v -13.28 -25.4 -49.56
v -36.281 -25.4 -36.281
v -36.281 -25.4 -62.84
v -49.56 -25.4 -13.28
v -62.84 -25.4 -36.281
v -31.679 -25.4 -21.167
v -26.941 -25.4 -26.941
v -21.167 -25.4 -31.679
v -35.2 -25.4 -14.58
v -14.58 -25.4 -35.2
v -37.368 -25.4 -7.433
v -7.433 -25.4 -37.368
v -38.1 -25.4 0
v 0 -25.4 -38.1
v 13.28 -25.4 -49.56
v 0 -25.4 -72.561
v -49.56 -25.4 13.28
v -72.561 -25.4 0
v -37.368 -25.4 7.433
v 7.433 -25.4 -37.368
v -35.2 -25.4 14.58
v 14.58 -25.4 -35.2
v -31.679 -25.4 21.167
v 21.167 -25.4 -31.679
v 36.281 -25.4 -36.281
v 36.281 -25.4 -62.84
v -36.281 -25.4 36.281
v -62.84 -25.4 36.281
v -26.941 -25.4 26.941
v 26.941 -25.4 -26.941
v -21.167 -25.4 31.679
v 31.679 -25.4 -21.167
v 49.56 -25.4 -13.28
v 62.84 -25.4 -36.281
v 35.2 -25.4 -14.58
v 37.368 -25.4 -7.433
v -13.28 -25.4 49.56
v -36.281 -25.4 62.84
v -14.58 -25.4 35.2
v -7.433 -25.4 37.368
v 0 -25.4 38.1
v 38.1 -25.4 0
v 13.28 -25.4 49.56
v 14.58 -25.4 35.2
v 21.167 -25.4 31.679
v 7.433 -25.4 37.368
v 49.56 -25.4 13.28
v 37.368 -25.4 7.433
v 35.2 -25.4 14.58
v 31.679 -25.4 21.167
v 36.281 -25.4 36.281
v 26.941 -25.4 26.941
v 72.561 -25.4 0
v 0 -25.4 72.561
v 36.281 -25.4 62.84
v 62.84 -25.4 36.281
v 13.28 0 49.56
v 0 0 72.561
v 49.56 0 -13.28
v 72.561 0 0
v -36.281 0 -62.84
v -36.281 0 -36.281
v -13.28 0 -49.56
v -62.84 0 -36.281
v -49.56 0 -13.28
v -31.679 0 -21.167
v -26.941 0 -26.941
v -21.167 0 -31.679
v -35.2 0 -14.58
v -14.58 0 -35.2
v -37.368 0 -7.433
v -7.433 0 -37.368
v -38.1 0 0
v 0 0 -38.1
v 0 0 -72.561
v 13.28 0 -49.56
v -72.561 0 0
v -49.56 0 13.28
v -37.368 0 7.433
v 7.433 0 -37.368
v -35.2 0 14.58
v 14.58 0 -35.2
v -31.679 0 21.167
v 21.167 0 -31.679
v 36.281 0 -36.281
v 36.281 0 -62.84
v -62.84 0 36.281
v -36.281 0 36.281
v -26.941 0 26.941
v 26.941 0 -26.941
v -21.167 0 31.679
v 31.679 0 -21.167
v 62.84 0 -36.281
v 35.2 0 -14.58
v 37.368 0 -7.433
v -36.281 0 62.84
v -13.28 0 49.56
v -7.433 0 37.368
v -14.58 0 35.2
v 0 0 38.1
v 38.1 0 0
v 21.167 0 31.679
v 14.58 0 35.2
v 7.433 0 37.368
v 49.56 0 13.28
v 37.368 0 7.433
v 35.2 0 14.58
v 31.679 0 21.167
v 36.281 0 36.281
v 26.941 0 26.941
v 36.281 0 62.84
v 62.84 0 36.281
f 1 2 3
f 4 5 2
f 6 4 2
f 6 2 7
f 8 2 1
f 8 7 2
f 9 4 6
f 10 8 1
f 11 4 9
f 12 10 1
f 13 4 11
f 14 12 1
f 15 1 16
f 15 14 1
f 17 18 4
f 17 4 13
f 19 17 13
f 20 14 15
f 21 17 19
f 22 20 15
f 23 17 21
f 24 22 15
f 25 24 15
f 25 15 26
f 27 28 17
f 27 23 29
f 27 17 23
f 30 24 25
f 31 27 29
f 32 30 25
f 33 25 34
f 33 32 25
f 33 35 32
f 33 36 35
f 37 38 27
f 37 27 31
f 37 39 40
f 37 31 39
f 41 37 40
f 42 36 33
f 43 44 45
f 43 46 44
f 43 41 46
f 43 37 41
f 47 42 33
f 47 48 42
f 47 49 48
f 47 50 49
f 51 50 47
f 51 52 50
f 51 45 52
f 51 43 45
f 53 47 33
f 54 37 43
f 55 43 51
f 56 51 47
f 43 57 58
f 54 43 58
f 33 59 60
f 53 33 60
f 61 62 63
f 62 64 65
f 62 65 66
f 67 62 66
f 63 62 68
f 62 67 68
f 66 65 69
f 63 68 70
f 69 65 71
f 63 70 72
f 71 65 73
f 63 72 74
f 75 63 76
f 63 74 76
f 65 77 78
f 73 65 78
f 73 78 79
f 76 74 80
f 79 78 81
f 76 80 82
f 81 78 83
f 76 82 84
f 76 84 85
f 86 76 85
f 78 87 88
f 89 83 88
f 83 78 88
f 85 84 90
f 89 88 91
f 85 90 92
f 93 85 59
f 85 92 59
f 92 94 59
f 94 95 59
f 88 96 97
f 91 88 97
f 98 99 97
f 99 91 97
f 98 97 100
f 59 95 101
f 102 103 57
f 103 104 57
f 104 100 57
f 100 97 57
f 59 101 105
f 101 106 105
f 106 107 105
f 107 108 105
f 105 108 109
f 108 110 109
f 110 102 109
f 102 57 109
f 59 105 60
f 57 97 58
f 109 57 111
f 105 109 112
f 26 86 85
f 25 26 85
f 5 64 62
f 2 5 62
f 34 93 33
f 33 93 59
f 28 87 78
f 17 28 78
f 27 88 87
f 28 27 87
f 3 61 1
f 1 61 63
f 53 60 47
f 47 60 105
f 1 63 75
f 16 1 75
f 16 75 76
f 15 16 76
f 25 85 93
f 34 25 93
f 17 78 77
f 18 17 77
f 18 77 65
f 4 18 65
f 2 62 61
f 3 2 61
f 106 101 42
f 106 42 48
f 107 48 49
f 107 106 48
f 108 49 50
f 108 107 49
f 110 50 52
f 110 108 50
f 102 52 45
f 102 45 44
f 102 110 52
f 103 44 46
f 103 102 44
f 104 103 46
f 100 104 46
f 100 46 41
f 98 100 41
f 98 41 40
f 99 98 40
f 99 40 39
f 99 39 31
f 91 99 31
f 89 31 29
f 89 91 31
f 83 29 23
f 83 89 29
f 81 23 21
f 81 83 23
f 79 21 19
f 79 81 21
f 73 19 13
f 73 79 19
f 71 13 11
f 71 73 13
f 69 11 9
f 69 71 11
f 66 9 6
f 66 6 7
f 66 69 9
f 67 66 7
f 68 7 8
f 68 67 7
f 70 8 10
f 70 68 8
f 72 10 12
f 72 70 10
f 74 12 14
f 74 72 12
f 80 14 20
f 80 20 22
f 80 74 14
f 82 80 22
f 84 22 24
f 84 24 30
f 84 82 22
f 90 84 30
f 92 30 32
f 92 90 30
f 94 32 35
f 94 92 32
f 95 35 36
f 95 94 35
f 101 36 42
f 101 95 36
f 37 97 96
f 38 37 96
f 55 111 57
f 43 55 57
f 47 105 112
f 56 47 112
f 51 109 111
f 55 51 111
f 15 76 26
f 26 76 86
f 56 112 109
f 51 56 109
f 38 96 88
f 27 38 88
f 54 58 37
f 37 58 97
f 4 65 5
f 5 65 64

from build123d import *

# Parameters (mm, degrees)
F0_R     = 38.1
F1_DEPTH = 25.4


with BuildPart() as f1:
    # F0 (on Front) → F1 (new body)
    with BuildSketch(Plane.XZ):
        with BuildLine():
            ThreePointArc((49.1988245643, 12.6536817364), (50.3981164721, 6.3772922205), (50.8, 0))
            ThreePointArc((50.8, 0), (50.3981164721, -6.3772922205), (49.1988245643, -12.6536817364))
            Line((49.1988245643, -12.6536817364), (49.5602090261, -13.2796179853))
            Line((49.5602090261, -13.2796179853), (72.5611820817, 0))
            Line((72.5611820817, 0), (49.5602090261, 13.2796179853))
            Line((49.5602090261, 13.2796179853), (49.1988245643, 12.6536817364))
        make_face()
        with BuildLine():
            ThreePointArc((48.9342727773, 13.641002447), (49.0690319755, 13.1480074912), (49.1988245643, 12.6536817364))
            Line((49.1988245643, 12.6536817364), (49.5602090261, 13.2796179853))
            Line((49.5602090261, 13.2796179853), (48.9342727773, 13.641002447))
        make_face()
        with BuildLine():
            Line((49.5602090261, -13.2796179853), (49.1988245643, -12.6536817364))
            ThreePointArc((49.1988245643, -12.6536817364), (49.0690319755, -13.1480074912), (48.9342727773, -13.641002447))
            Line((48.9342727773, -13.641002447), (49.5602090261, -13.2796179853))
        make_face()
        with BuildLine():
            ThreePointArc((36.2805910408, 35.5578221173), (43.9940905122, 25.4), (48.9342727773, 13.641002447))
            Line((48.9342727773, 13.641002447), (49.5602090261, 13.2796179853))
            Line((49.5602090261, 13.2796179853), (62.8398270114, 36.2805910408))
            Line((62.8398270114, 36.2805910408), (36.2805910408, 36.2805910408))
            Line((36.2805910408, 36.2805910408), (36.2805910408, 35.5578221173))
        make_face()
        with BuildLine():
            Line((49.5602090261, -13.2796179853), (48.9342727773, -13.641002447))
            ThreePointArc((48.9342727773, -13.641002447), (43.9940905122, -25.4), (36.2805910408, -35.5578221173))
            Line((36.2805910408, -35.5578221173), (36.2805910408, -36.2805910408))
            Line((36.2805910408, -36.2805910408), (62.8398270114, -36.2805910408))
            Line((62.8398270114, -36.2805910408), (49.5602090261, -13.2796179853))
        make_face()
        with BuildLine():
            ThreePointArc((35.5578221173, 36.2805910408), (35.9210244843, 35.9210244843), (36.2805910408, 35.5578221173))
            Line((36.2805910408, 35.5578221173), (36.2805910408, 36.2805910408))
            Line((36.2805910408, 36.2805910408), (35.5578221173, 36.2805910408))
        make_face()
        with BuildLine():
            Line((36.2805910408, -36.2805910408), (36.2805910408, -35.5578221173))
            ThreePointArc((36.2805910408, -35.5578221173), (35.9210244843, -35.9210244843), (35.5578221173, -36.2805910408))
            Line((35.5578221173, -36.2805910408), (36.2805910408, -36.2805910408))
        make_face()
        with BuildLine():
            ThreePointArc((13.641002447, 48.9342727773), (25.4, 43.9940905122), (35.5578221173, 36.2805910408))
            Line((35.5578221173, 36.2805910408), (36.2805910408, 36.2805910408))
            Line((36.2805910408, 36.2805910408), (36.2805910408, 62.8398270114))
            Line((36.2805910408, 62.8398270114), (13.2796179853, 49.5602090261))
            Line((13.2796179853, 49.5602090261), (13.641002447, 48.9342727773))
        make_face()
        with BuildLine():
            Line((36.2805910408, -36.2805910408), (35.5578221173, -36.2805910408))
            ThreePointArc((35.5578221173, -36.2805910408), (25.4, -43.9940905122), (13.641002447, -48.9342727773))
            Line((13.641002447, -48.9342727773), (13.2796179853, -49.5602090261))
            Line((13.2796179853, -49.5602090261), (36.2805910408, -62.8398270114))
            Line((36.2805910408, -62.8398270114), (36.2805910408, -36.2805910408))
        make_face()
        with BuildLine():
            ThreePointArc((12.6536817364, 49.1988245643), (13.1480074912, 49.0690319755), (13.641002447, 48.9342727773))
            Line((13.641002447, 48.9342727773), (13.2796179853, 49.5602090261))
            Line((13.2796179853, 49.5602090261), (12.6536817364, 49.1988245643))
        make_face()
        with BuildLine():
            Line((13.2796179853, -49.5602090261), (13.641002447, -48.9342727773))
            ThreePointArc((13.641002447, -48.9342727773), (13.1480074912, -49.0690319755), (12.6536817364, -49.1988245643))
            Line((12.6536817364, -49.1988245643), (13.2796179853, -49.5602090261))
        make_face()
        with BuildLine():
            ThreePointArc((-12.6536817364, 49.1988245643), (0, 50.8), (12.6536817364, 49.1988245643))
            Line((12.6536817364, 49.1988245643), (13.2796179853, 49.5602090261))
            Line((13.2796179853, 49.5602090261), (0, 72.5611820817))
            Line((0, 72.5611820817), (-13.2796179853, 49.5602090261))
            Line((-13.2796179853, 49.5602090261), (-12.6536817364, 49.1988245643))
        make_face()
        with BuildLine():
            Line((13.2796179853, -49.5602090261), (12.6536817364, -49.1988245643))
            ThreePointArc((12.6536817364, -49.1988245643), (0, -50.8), (-12.6536817364, -49.1988245643))
            Line((-12.6536817364, -49.1988245643), (-13.2796179853, -49.5602090261))
            Line((-13.2796179853, -49.5602090261), (0, -72.5611820817))
            Line((0, -72.5611820817), (13.2796179853, -49.5602090261))
        make_face()
        with BuildLine():
            ThreePointArc((-13.641002447, 48.9342727773), (-13.1480074912, 49.0690319755), (-12.6536817364, 49.1988245643))
            Line((-12.6536817364, 49.1988245643), (-13.2796179853, 49.5602090261))
            Line((-13.2796179853, 49.5602090261), (-13.641002447, 48.9342727773))
        make_face()
        with BuildLine():
            Line((-13.2796179853, -49.5602090261), (-12.6536817364, -49.1988245643))
            ThreePointArc((-12.6536817364, -49.1988245643), (-13.1480074912, -49.0690319755), (-13.641002447, -48.9342727773))
            Line((-13.641002447, -48.9342727773), (-13.2796179853, -49.5602090261))
        make_face()
        with BuildLine():
            ThreePointArc((-35.5578221173, 36.2805910408), (-25.4, 43.9940905122), (-13.641002447, 48.9342727773))
            Line((-13.641002447, 48.9342727773), (-13.2796179853, 49.5602090261))
            Line((-13.2796179853, 49.5602090261), (-36.2805910408, 62.8398270114))
            Line((-36.2805910408, 62.8398270114), (-36.2805910408, 36.2805910408))
            Line((-36.2805910408, 36.2805910408), (-35.5578221173, 36.2805910408))
        make_face()
        with BuildLine():
            Line((-13.2796179853, -49.5602090261), (-13.641002447, -48.9342727773))
            ThreePointArc((-13.641002447, -48.9342727773), (-25.4, -43.9940905122), (-35.5578221173, -36.2805910408))
            Line((-35.5578221173, -36.2805910408), (-36.2805910408, -36.2805910408))
            Line((-36.2805910408, -36.2805910408), (-36.2805910408, -62.8398270114))
            Line((-36.2805910408, -62.8398270114), (-13.2796179853, -49.5602090261))
        make_face()
        with BuildLine():
            ThreePointArc((-36.2805910408, 35.5578221173), (-35.9210244843, 35.9210244843), (-35.5578221173, 36.2805910408))
            Line((-35.5578221173, 36.2805910408), (-36.2805910408, 36.2805910408))
            Line((-36.2805910408, 36.2805910408), (-36.2805910408, 35.5578221173))
        make_face()
        with BuildLine():
            Line((-36.2805910408, -36.2805910408), (-35.5578221173, -36.2805910408))
            ThreePointArc((-35.5578221173, -36.2805910408), (-35.9210244843, -35.9210244843), (-36.2805910408, -35.5578221173))
            Line((-36.2805910408, -35.5578221173), (-36.2805910408, -36.2805910408))
        make_face()
        with BuildLine():
            ThreePointArc((-48.9342727773, 13.641002447), (-43.9940905122, 25.4), (-36.2805910408, 35.5578221173))
            Line((-36.2805910408, 35.5578221173), (-36.2805910408, 36.2805910408))
            Line((-36.2805910408, 36.2805910408), (-62.8398270114, 36.2805910408))
            Line((-62.8398270114, 36.2805910408), (-49.5602090261, 13.2796179853))
            Line((-49.5602090261, 13.2796179853), (-48.9342727773, 13.641002447))
        make_face()
        with BuildLine():
            Line((-36.2805910408, -36.2805910408), (-36.2805910408, -35.5578221173))
            ThreePointArc((-36.2805910408, -35.5578221173), (-43.9940905122, -25.4), (-48.9342727773, -13.641002447))
            Line((-48.9342727773, -13.641002447), (-49.5602090261, -13.2796179853))
            Line((-49.5602090261, -13.2796179853), (-62.8398270114, -36.2805910408))
            Line((-62.8398270114, -36.2805910408), (-36.2805910408, -36.2805910408))
        make_face()
        with BuildLine():
            ThreePointArc((-49.1988245643, 12.6536817364), (-49.0690319755, 13.1480074912), (-48.9342727773, 13.641002447))
            Line((-48.9342727773, 13.641002447), (-49.5602090261, 13.2796179853))
            Line((-49.5602090261, 13.2796179853), (-49.1988245643, 12.6536817364))
        make_face()
        with BuildLine():
            Line((-49.5602090261, -13.2796179853), (-48.9342727773, -13.641002447))
            ThreePointArc((-48.9342727773, -13.641002447), (-49.0690319755, -13.1480074912), (-49.1988245643, -12.6536817364))
            Line((-49.1988245643, -12.6536817364), (-49.5602090261, -13.2796179853))
        make_face()
        with BuildLine():
            ThreePointArc((-49.1988245643, -12.6536817364), (-50.8, 0), (-49.1988245643, 12.6536817364))
            Line((-49.1988245643, 12.6536817364), (-49.5602090261, 13.2796179853))
            Line((-49.5602090261, 13.2796179853), (-72.5611820817, 0))
            Line((-72.5611820817, 0), (-49.5602090261, -13.2796179853))
            Line((-49.5602090261, -13.2796179853), (-49.1988245643, -12.6536817364))
        make_face()
        with BuildLine():
            ThreePointArc((49.1988245643, -12.6536817364), (50.3981164721, -6.3772922205), (50.8, 0))
            ThreePointArc((50.8, 0), (50.3981164721, 6.3772922205), (49.1988245643, 12.6536817364))
            ThreePointArc((49.1988245643, 12.6536817364), (49.0690319755, 13.1480074912), (48.9342727773, 13.641002447))
            ThreePointArc((48.9342727773, 13.641002447), (43.9940905122, 25.4), (36.2805910408, 35.5578221173))
            ThreePointArc((36.2805910408, 35.5578221173), (35.9210244843, 35.9210244843), (35.5578221173, 36.2805910408))
            ThreePointArc((35.5578221173, 36.2805910408), (25.4, 43.9940905122), (13.641002447, 48.9342727773))
            ThreePointArc((13.641002447, 48.9342727773), (13.1480074912, 49.0690319755), (12.6536817364, 49.1988245643))
            ThreePointArc((12.6536817364, 49.1988245643), (0, 50.8), (-12.6536817364, 49.1988245643))
            ThreePointArc((-12.6536817364, 49.1988245643), (-13.1480074912, 49.0690319755), (-13.641002447, 48.9342727773))
            ThreePointArc((-13.641002447, 48.9342727773), (-25.4, 43.9940905122), (-35.5578221173, 36.2805910408))
            ThreePointArc((-35.5578221173, 36.2805910408), (-35.9210244843, 35.9210244843), (-36.2805910408, 35.5578221173))
            ThreePointArc((-36.2805910408, 35.5578221173), (-43.9940905122, 25.4), (-48.9342727773, 13.641002447))
            ThreePointArc((-48.9342727773, 13.641002447), (-49.0690319755, 13.1480074912), (-49.1988245643, 12.6536817364))
            ThreePointArc((-49.1988245643, 12.6536817364), (-50.8, 0), (-49.1988245643, -12.6536817364))
            ThreePointArc((-49.1988245643, -12.6536817364), (-49.0690319755, -13.1480074912), (-48.9342727773, -13.641002447))
            ThreePointArc((-48.9342727773, -13.641002447), (-43.9940905122, -25.4), (-36.2805910408, -35.5578221173))
            ThreePointArc((-36.2805910408, -35.5578221173), (-35.9210244843, -35.9210244843), (-35.5578221173, -36.2805910408))
            ThreePointArc((-35.5578221173, -36.2805910408), (-25.4, -43.9940905122), (-13.641002447, -48.9342727773))
            ThreePointArc((-13.641002447, -48.9342727773), (-13.1480074912, -49.0690319755), (-12.6536817364, -49.1988245643))
            ThreePointArc((-12.6536817364, -49.1988245643), (0, -50.8), (12.6536817364, -49.1988245643))
            ThreePointArc((12.6536817364, -49.1988245643), (13.1480074912, -49.0690319755), (13.641002447, -48.9342727773))
            ThreePointArc((13.641002447, -48.9342727773), (25.4, -43.9940905122), (35.5578221173, -36.2805910408))
            ThreePointArc((35.5578221173, -36.2805910408), (35.9210244843, -35.9210244843), (36.2805910408, -35.5578221173))
            ThreePointArc((36.2805910408, -35.5578221173), (43.9940905122, -25.4), (48.9342727773, -13.641002447))
            ThreePointArc((48.9342727773, -13.641002447), (49.0690319755, -13.1480074912), (49.1988245643, -12.6536817364))
        make_face()
        Circle(F0_R, mode=Mode.SUBTRACT)
    extrude(amount=F1_DEPTH)


solid = f1.part
